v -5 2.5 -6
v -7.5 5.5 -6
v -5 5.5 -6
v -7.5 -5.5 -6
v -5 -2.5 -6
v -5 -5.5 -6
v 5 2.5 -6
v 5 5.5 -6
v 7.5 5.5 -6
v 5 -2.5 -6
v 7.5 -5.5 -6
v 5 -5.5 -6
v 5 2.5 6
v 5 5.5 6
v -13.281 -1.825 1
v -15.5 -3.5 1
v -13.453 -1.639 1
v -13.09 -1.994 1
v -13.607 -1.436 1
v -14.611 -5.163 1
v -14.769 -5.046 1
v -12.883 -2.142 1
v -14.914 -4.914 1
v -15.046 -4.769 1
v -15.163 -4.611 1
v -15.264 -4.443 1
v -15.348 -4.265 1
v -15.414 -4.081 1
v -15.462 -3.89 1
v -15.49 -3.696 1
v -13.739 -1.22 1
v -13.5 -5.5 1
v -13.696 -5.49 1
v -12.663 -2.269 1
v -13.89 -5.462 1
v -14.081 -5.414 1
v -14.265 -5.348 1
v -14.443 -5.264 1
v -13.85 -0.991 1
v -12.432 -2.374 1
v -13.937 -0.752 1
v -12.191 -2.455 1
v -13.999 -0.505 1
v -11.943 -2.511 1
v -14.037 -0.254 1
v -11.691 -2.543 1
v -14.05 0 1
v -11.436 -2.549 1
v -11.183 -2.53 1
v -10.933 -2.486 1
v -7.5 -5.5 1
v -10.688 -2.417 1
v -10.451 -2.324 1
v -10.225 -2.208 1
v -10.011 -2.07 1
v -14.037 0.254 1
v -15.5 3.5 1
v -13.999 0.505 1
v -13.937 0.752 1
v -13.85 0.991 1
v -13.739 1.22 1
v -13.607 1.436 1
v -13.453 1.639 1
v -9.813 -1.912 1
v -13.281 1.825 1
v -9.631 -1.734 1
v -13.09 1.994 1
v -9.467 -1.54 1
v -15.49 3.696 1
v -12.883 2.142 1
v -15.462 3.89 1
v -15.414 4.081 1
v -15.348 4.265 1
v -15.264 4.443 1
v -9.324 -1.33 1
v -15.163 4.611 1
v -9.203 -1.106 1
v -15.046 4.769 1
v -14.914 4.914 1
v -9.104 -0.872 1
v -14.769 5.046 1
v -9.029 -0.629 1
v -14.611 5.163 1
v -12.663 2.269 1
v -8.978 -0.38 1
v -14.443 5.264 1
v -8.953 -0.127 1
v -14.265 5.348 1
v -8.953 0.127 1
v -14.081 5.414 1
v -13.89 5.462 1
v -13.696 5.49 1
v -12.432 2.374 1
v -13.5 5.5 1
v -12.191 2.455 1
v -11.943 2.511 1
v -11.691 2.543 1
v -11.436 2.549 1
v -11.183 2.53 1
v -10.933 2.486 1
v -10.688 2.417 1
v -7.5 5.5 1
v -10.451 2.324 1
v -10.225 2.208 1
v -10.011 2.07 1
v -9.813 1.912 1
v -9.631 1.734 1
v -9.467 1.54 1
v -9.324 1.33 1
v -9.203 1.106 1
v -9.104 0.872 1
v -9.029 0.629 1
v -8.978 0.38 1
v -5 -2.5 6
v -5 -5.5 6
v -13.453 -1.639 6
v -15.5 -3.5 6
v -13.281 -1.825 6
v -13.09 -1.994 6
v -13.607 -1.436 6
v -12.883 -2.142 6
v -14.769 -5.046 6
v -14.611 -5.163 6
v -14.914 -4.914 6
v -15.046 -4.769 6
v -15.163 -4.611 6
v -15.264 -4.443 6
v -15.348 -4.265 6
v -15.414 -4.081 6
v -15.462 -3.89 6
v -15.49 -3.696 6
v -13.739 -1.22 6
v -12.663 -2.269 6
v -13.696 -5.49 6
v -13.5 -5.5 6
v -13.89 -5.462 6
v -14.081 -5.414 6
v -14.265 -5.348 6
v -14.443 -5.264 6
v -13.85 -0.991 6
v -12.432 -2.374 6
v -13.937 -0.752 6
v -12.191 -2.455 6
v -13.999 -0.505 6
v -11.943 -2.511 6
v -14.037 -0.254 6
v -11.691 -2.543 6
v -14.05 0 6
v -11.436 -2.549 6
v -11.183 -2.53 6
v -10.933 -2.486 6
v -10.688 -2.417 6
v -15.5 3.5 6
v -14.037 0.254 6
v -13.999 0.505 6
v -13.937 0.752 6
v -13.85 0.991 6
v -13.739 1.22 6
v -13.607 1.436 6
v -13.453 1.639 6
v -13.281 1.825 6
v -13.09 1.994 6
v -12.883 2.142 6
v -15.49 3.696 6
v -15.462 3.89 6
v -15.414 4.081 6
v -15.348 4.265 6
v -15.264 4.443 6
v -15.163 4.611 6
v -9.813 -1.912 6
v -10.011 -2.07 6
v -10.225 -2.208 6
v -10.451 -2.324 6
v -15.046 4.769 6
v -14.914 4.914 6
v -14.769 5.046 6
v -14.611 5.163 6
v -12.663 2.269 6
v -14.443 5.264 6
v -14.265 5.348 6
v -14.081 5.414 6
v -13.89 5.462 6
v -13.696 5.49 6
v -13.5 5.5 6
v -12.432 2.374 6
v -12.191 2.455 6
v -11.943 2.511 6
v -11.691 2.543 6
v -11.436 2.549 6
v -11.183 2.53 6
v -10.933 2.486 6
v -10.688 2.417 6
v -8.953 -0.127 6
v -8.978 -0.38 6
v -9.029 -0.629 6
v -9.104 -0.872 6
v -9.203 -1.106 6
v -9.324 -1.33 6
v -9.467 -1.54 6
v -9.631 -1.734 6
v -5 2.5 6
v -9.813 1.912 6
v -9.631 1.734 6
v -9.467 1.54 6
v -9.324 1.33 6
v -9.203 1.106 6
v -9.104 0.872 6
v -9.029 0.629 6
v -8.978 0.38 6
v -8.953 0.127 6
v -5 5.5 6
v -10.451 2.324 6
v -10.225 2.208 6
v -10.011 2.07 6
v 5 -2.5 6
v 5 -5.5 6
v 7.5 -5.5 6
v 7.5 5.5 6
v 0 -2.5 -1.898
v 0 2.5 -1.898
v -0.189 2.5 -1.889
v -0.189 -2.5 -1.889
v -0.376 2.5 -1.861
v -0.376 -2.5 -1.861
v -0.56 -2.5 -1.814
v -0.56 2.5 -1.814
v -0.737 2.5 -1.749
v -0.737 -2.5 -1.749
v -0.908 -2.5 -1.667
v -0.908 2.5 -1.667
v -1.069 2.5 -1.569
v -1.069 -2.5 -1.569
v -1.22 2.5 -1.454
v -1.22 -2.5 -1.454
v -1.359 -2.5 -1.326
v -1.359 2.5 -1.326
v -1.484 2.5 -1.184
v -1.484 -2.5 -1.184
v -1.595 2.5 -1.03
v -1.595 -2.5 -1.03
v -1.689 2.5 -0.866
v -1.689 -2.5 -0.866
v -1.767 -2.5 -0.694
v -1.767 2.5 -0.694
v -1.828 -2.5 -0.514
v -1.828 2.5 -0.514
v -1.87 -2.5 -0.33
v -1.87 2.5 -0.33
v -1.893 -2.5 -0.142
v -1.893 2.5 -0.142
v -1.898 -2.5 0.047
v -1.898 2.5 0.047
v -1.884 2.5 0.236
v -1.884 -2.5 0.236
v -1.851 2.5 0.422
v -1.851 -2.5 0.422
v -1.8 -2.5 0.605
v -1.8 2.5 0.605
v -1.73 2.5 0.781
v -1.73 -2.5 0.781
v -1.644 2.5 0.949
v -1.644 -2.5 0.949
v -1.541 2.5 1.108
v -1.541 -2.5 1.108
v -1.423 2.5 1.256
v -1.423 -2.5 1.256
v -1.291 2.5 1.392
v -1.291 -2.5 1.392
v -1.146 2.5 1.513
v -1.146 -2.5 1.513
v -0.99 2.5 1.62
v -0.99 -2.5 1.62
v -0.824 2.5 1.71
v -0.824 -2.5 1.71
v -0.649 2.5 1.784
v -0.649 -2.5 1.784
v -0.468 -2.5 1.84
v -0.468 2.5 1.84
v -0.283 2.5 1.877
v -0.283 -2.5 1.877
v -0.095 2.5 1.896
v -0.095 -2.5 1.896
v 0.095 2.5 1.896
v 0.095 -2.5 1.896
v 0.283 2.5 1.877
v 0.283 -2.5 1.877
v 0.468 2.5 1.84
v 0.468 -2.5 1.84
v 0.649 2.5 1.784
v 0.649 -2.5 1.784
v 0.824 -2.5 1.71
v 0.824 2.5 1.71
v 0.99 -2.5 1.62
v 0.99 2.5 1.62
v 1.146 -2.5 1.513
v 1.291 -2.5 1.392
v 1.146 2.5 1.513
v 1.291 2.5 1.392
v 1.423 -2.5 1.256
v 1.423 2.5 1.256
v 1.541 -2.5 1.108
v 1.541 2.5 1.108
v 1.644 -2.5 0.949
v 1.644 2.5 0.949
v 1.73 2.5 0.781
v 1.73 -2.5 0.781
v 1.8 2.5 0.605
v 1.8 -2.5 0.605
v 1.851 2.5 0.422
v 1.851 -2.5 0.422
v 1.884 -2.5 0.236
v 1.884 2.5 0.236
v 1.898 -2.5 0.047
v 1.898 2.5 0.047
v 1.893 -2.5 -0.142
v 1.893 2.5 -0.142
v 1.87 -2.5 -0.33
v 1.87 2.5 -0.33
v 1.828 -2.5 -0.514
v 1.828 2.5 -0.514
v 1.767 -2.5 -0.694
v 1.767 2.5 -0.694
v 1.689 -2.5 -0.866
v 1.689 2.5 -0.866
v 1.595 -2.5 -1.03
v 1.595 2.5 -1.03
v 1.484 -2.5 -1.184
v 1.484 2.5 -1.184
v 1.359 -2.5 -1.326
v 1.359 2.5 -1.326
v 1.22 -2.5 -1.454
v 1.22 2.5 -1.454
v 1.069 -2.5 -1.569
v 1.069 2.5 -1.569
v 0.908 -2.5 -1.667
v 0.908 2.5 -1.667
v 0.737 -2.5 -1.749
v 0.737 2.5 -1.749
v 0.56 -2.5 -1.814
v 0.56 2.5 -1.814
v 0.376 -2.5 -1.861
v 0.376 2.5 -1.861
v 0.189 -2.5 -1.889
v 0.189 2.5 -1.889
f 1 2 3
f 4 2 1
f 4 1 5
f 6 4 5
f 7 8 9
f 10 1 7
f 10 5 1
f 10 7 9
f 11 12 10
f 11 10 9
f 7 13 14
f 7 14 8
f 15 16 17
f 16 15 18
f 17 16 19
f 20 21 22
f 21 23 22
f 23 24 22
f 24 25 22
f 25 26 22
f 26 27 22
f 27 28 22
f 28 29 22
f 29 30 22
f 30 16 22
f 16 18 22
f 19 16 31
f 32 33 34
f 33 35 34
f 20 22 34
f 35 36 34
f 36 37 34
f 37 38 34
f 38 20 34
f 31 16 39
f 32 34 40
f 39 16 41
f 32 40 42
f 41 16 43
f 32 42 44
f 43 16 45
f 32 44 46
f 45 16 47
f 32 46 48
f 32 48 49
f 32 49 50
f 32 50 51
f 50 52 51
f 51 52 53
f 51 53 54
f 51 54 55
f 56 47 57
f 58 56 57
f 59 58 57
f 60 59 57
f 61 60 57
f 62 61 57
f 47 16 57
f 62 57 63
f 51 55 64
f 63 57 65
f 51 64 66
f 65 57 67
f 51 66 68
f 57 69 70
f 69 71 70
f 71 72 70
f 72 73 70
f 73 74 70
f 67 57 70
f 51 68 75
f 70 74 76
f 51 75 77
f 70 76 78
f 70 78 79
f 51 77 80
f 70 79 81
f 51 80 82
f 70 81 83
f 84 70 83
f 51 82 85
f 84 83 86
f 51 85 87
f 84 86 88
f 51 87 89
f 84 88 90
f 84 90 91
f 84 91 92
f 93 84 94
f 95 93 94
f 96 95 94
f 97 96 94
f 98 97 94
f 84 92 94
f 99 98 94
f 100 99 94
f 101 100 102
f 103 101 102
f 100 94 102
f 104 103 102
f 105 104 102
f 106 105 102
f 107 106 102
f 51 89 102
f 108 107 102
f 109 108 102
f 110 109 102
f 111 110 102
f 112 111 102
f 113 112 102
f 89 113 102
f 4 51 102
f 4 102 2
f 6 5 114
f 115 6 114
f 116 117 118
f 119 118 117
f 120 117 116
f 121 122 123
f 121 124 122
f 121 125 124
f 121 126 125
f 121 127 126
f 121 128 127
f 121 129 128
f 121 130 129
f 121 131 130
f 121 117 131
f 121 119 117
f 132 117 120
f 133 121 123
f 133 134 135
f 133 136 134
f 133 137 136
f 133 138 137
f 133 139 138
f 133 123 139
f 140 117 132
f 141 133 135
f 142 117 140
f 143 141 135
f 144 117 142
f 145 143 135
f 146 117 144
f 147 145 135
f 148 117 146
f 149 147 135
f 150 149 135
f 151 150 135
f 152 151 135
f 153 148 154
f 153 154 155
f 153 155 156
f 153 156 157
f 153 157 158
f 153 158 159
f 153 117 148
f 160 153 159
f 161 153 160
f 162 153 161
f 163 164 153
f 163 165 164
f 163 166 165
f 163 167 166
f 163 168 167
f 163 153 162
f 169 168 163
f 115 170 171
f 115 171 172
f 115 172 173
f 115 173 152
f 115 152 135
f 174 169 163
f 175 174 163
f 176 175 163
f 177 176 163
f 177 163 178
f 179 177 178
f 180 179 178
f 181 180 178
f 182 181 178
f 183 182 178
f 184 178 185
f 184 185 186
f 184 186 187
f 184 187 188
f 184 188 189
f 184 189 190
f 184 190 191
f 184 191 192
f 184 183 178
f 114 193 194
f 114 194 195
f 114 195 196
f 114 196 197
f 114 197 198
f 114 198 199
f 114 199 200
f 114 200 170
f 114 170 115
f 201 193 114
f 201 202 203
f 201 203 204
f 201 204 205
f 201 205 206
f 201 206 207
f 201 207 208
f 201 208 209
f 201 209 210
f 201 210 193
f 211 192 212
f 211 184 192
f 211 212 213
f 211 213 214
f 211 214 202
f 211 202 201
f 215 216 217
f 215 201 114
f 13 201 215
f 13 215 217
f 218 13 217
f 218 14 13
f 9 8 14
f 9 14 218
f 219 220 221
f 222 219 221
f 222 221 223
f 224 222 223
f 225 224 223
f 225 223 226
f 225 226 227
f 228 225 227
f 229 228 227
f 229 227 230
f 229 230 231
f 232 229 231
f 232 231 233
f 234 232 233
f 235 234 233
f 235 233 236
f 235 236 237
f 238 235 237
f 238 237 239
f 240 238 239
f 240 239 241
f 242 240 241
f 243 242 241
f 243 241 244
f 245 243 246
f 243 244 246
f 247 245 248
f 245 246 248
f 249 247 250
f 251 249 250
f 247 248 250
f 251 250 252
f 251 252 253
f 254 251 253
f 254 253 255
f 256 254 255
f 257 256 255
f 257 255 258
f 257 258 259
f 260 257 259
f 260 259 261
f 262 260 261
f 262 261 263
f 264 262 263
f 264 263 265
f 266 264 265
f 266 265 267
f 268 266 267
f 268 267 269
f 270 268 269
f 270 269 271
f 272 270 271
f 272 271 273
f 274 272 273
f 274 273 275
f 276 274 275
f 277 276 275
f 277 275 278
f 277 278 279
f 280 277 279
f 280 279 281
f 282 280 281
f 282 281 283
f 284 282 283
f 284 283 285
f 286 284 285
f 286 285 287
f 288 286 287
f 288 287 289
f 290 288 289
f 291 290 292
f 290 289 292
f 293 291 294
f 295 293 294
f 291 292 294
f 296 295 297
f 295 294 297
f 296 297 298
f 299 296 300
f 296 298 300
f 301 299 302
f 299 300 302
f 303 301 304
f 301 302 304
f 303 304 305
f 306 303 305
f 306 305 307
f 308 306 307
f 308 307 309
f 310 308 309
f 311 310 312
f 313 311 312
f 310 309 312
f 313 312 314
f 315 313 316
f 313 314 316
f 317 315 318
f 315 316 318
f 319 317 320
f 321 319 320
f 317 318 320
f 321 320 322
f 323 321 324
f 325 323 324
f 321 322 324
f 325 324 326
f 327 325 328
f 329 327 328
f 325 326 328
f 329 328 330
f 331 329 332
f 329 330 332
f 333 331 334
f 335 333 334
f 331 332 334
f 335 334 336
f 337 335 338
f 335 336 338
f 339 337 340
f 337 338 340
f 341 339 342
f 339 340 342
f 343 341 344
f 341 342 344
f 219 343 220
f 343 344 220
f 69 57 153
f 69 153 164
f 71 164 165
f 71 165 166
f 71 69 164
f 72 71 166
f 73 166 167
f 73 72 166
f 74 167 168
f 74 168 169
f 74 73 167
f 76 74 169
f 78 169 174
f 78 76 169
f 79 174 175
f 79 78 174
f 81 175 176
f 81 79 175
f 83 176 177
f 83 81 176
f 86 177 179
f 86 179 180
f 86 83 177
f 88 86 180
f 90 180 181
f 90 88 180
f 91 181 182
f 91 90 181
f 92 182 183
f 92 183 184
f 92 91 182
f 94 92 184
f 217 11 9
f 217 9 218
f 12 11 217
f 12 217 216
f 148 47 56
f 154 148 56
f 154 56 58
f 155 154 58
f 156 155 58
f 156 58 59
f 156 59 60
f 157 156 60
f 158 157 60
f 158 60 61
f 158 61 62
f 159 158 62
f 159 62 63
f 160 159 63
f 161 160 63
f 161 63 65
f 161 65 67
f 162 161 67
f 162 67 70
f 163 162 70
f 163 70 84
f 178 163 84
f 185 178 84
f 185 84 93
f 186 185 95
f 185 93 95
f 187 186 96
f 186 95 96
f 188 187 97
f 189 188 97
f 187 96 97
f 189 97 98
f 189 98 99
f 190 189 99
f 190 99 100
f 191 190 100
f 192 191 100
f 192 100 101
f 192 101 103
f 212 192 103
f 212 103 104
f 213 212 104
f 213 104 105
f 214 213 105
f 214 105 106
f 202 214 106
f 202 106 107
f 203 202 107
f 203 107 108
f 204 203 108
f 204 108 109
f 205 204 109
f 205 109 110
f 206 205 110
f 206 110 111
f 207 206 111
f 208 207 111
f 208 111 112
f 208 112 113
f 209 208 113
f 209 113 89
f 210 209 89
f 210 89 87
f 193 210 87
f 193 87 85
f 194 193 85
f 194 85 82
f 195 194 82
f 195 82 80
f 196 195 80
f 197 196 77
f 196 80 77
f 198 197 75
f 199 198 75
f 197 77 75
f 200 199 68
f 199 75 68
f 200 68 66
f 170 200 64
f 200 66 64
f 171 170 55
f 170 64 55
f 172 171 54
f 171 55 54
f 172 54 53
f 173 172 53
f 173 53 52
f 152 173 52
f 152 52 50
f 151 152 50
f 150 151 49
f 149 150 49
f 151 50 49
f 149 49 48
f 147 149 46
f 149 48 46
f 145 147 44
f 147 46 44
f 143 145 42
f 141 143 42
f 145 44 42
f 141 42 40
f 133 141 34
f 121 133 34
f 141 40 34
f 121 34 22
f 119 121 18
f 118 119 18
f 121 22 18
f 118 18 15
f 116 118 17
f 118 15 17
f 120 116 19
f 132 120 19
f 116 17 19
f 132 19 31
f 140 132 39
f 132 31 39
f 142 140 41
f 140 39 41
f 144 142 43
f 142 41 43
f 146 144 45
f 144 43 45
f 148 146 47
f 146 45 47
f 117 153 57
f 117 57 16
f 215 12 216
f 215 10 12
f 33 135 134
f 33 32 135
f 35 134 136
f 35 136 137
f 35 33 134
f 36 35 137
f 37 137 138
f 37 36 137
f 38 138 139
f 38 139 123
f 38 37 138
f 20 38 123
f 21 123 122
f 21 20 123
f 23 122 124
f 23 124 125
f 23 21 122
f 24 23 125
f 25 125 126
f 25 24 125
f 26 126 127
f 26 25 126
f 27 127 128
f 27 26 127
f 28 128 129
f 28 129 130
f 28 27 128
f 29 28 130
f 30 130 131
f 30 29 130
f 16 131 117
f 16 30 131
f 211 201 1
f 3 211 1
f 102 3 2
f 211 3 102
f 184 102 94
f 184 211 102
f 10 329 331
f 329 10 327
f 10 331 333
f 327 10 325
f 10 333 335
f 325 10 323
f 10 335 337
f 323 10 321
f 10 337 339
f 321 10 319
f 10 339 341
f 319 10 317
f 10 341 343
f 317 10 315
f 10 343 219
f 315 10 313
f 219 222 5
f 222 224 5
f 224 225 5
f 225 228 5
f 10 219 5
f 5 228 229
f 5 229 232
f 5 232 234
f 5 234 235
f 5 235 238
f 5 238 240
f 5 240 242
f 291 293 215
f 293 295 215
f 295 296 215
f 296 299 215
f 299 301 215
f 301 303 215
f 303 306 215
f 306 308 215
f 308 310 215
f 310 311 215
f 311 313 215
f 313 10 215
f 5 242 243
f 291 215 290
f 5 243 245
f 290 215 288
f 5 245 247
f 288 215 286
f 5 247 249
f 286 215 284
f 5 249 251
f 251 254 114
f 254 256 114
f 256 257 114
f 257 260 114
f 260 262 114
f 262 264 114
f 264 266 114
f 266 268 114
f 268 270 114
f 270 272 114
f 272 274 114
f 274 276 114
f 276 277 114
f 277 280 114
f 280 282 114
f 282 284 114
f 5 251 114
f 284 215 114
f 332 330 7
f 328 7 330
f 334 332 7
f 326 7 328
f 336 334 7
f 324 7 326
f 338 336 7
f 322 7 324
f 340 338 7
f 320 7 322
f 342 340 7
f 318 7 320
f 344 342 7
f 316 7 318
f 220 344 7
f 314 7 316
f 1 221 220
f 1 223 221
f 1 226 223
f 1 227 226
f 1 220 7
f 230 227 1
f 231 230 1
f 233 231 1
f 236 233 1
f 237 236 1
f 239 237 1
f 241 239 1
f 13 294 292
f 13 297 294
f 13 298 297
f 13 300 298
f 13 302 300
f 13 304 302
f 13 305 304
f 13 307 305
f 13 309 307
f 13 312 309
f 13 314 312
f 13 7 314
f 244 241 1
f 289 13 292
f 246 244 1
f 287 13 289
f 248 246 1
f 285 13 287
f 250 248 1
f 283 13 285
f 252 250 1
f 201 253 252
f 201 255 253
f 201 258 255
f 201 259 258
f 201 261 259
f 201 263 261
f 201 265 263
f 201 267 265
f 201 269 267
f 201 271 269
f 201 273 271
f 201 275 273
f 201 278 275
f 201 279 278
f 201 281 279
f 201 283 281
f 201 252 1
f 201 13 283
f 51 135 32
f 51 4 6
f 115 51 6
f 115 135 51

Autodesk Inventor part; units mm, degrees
ref_plane "YZ Plane" through (0, 0, 0) normal (1, 0, 0) x (0, 1, 0)
ref_plane "XZ Plane" through (0, 0, 0) normal (0, 1, 0) x (-1, 0, 0)
ref_plane "XY Plane" through (0, 0, 0) normal (0, 0, 1) x (1, 0, 0)
sketch "Sketch1" plane through (0, 0, 0) normal (0, 1, 0) x (-1, 0, 0)
  line L0 (-7.5, 6) -> (7.5, 6)
  line L1 (7.5, 6) -> (7.5, -6)
  line L2 (7.5, -6) -> (-7.5, -6)
  line L3 (-7.5, -6) -> (-7.5, 6)
  line L4 (-7.5, 6) -> (7.5, -6) construction
  line L5 (7.5, 6) -> (-7.5, -6) construction
  point P0 (0, 0)
  dimension "d0" = 12
  dimension "d1" = 15
extrude "Extrusion1" add sketch "Sketch1" along normal mid plane 5
sketch "Sketch2" plane through (0, 2.5, 0) normal (0, 1, 0) x (1, 0, 0)
  line L0 (-5, 6) -> (-7.5, 6)
  line L1 (-7.5, 6) -> (-7.5, -6)
  line L2 (-7.5, -6) -> (-5, -6)
  line L3 (-5, -6) -> (-5, 6)
  line L4 (-5, 6) -> (-7.5, -6) construction
  line L5 (-7.5, 6) -> (-5, -6) construction
  line L6 (7.5, -6) -> (7.5, 6) projected
  line L7 (5, 6) -> (7.5, 6)
  line L8 (7.5, 6) -> (7.5, -6)
  line L9 (7.5, -6) -> (5, -6)
  line L10 (5, -6) -> (5, 6)
  line L11 (5, 6) -> (7.5, -6) construction
  line L12 (7.5, 6) -> (5, -6) construction
  line L13 (5, 0) -> (-5, 0) construction
  point P0 (0, 0)
  point P1 (-6.25, 0)
  point P2 (6.25, 0)
  point P3 (0, 0)
  dimension "d15" = 10
extrude "Extrusion2" add sketch "Sketch2" along normal blind 3
sketch "Sketch3" plane through (0, -2.5, 0) normal (0, -1, 0) x (1, 0, 0)
  point P0 (0, 0)
hole "Hole1" at (0, -2.5, 0) direction (0, 1, 0) diameter 3.797 end through all clearance for "Flat Head Machine Screw (82)" size "#6" standard "Ansi Unified Screw Threads"
mirror "Mirror1" about plane through (0, 0, 0) normal (0, 1, 0)
sketch "Sketch4" plane through (-5, 2.5, 6) normal (0, 0, 1) x (1, 0, 0)
  line L0 (-2.5, 3) -> (-2.5, -8) projected
  line L1 (-10.5, -8) -> (-2.5, -8)
  line L2 (-2.5, -8) -> (-2.5, 3)
  line L3 (-2.5, 3) -> (-10.5, 3)
  line L4 (-10.5, 3) -> (-10.5, -8)
  line L5 (-10.5, -8) -> (-2.5, 3) construction
  line L6 (-2.5, -8) -> (-10.5, 3) construction
  line L7 (-2.5, -8) -> (0, -8) projected
  point P0 (5, -2.5)
  point P1 (-6.5, -2.5)
  dimension "d16" = 8
extrude "Extrusion3" add sketch "Sketch4" against normal blind 5
sketch "Sketch5" plane through (-5, 2.5, 1) normal (0, 0, -1) x (-1, 0, 0)
  line L0 (10.5, -8) -> (10.5, 3) projected
  line L1 (2.5, -8) -> (10.5, -8) projected
  circle A0 centre (6.5, -2.5) radius 2.55
  point P0 (-5, -2.5)
  point P1 (10.5, -2.5)
  point P2 (6.5, -8)
  point P3 (10.5, -2.5)
  point P4 (6.5, -8)
  point P5 (6.5, -8)
  dimension "d19" = 5.1
extrude "Extrusion4" cut sketch "Sketch5" against normal through all
fillet "Fillet1" radius 2 2 edges at (-15.5, 5.5, 3.5) (-15.5, -5.5, 3.5)
properties part number "StopRotation"
